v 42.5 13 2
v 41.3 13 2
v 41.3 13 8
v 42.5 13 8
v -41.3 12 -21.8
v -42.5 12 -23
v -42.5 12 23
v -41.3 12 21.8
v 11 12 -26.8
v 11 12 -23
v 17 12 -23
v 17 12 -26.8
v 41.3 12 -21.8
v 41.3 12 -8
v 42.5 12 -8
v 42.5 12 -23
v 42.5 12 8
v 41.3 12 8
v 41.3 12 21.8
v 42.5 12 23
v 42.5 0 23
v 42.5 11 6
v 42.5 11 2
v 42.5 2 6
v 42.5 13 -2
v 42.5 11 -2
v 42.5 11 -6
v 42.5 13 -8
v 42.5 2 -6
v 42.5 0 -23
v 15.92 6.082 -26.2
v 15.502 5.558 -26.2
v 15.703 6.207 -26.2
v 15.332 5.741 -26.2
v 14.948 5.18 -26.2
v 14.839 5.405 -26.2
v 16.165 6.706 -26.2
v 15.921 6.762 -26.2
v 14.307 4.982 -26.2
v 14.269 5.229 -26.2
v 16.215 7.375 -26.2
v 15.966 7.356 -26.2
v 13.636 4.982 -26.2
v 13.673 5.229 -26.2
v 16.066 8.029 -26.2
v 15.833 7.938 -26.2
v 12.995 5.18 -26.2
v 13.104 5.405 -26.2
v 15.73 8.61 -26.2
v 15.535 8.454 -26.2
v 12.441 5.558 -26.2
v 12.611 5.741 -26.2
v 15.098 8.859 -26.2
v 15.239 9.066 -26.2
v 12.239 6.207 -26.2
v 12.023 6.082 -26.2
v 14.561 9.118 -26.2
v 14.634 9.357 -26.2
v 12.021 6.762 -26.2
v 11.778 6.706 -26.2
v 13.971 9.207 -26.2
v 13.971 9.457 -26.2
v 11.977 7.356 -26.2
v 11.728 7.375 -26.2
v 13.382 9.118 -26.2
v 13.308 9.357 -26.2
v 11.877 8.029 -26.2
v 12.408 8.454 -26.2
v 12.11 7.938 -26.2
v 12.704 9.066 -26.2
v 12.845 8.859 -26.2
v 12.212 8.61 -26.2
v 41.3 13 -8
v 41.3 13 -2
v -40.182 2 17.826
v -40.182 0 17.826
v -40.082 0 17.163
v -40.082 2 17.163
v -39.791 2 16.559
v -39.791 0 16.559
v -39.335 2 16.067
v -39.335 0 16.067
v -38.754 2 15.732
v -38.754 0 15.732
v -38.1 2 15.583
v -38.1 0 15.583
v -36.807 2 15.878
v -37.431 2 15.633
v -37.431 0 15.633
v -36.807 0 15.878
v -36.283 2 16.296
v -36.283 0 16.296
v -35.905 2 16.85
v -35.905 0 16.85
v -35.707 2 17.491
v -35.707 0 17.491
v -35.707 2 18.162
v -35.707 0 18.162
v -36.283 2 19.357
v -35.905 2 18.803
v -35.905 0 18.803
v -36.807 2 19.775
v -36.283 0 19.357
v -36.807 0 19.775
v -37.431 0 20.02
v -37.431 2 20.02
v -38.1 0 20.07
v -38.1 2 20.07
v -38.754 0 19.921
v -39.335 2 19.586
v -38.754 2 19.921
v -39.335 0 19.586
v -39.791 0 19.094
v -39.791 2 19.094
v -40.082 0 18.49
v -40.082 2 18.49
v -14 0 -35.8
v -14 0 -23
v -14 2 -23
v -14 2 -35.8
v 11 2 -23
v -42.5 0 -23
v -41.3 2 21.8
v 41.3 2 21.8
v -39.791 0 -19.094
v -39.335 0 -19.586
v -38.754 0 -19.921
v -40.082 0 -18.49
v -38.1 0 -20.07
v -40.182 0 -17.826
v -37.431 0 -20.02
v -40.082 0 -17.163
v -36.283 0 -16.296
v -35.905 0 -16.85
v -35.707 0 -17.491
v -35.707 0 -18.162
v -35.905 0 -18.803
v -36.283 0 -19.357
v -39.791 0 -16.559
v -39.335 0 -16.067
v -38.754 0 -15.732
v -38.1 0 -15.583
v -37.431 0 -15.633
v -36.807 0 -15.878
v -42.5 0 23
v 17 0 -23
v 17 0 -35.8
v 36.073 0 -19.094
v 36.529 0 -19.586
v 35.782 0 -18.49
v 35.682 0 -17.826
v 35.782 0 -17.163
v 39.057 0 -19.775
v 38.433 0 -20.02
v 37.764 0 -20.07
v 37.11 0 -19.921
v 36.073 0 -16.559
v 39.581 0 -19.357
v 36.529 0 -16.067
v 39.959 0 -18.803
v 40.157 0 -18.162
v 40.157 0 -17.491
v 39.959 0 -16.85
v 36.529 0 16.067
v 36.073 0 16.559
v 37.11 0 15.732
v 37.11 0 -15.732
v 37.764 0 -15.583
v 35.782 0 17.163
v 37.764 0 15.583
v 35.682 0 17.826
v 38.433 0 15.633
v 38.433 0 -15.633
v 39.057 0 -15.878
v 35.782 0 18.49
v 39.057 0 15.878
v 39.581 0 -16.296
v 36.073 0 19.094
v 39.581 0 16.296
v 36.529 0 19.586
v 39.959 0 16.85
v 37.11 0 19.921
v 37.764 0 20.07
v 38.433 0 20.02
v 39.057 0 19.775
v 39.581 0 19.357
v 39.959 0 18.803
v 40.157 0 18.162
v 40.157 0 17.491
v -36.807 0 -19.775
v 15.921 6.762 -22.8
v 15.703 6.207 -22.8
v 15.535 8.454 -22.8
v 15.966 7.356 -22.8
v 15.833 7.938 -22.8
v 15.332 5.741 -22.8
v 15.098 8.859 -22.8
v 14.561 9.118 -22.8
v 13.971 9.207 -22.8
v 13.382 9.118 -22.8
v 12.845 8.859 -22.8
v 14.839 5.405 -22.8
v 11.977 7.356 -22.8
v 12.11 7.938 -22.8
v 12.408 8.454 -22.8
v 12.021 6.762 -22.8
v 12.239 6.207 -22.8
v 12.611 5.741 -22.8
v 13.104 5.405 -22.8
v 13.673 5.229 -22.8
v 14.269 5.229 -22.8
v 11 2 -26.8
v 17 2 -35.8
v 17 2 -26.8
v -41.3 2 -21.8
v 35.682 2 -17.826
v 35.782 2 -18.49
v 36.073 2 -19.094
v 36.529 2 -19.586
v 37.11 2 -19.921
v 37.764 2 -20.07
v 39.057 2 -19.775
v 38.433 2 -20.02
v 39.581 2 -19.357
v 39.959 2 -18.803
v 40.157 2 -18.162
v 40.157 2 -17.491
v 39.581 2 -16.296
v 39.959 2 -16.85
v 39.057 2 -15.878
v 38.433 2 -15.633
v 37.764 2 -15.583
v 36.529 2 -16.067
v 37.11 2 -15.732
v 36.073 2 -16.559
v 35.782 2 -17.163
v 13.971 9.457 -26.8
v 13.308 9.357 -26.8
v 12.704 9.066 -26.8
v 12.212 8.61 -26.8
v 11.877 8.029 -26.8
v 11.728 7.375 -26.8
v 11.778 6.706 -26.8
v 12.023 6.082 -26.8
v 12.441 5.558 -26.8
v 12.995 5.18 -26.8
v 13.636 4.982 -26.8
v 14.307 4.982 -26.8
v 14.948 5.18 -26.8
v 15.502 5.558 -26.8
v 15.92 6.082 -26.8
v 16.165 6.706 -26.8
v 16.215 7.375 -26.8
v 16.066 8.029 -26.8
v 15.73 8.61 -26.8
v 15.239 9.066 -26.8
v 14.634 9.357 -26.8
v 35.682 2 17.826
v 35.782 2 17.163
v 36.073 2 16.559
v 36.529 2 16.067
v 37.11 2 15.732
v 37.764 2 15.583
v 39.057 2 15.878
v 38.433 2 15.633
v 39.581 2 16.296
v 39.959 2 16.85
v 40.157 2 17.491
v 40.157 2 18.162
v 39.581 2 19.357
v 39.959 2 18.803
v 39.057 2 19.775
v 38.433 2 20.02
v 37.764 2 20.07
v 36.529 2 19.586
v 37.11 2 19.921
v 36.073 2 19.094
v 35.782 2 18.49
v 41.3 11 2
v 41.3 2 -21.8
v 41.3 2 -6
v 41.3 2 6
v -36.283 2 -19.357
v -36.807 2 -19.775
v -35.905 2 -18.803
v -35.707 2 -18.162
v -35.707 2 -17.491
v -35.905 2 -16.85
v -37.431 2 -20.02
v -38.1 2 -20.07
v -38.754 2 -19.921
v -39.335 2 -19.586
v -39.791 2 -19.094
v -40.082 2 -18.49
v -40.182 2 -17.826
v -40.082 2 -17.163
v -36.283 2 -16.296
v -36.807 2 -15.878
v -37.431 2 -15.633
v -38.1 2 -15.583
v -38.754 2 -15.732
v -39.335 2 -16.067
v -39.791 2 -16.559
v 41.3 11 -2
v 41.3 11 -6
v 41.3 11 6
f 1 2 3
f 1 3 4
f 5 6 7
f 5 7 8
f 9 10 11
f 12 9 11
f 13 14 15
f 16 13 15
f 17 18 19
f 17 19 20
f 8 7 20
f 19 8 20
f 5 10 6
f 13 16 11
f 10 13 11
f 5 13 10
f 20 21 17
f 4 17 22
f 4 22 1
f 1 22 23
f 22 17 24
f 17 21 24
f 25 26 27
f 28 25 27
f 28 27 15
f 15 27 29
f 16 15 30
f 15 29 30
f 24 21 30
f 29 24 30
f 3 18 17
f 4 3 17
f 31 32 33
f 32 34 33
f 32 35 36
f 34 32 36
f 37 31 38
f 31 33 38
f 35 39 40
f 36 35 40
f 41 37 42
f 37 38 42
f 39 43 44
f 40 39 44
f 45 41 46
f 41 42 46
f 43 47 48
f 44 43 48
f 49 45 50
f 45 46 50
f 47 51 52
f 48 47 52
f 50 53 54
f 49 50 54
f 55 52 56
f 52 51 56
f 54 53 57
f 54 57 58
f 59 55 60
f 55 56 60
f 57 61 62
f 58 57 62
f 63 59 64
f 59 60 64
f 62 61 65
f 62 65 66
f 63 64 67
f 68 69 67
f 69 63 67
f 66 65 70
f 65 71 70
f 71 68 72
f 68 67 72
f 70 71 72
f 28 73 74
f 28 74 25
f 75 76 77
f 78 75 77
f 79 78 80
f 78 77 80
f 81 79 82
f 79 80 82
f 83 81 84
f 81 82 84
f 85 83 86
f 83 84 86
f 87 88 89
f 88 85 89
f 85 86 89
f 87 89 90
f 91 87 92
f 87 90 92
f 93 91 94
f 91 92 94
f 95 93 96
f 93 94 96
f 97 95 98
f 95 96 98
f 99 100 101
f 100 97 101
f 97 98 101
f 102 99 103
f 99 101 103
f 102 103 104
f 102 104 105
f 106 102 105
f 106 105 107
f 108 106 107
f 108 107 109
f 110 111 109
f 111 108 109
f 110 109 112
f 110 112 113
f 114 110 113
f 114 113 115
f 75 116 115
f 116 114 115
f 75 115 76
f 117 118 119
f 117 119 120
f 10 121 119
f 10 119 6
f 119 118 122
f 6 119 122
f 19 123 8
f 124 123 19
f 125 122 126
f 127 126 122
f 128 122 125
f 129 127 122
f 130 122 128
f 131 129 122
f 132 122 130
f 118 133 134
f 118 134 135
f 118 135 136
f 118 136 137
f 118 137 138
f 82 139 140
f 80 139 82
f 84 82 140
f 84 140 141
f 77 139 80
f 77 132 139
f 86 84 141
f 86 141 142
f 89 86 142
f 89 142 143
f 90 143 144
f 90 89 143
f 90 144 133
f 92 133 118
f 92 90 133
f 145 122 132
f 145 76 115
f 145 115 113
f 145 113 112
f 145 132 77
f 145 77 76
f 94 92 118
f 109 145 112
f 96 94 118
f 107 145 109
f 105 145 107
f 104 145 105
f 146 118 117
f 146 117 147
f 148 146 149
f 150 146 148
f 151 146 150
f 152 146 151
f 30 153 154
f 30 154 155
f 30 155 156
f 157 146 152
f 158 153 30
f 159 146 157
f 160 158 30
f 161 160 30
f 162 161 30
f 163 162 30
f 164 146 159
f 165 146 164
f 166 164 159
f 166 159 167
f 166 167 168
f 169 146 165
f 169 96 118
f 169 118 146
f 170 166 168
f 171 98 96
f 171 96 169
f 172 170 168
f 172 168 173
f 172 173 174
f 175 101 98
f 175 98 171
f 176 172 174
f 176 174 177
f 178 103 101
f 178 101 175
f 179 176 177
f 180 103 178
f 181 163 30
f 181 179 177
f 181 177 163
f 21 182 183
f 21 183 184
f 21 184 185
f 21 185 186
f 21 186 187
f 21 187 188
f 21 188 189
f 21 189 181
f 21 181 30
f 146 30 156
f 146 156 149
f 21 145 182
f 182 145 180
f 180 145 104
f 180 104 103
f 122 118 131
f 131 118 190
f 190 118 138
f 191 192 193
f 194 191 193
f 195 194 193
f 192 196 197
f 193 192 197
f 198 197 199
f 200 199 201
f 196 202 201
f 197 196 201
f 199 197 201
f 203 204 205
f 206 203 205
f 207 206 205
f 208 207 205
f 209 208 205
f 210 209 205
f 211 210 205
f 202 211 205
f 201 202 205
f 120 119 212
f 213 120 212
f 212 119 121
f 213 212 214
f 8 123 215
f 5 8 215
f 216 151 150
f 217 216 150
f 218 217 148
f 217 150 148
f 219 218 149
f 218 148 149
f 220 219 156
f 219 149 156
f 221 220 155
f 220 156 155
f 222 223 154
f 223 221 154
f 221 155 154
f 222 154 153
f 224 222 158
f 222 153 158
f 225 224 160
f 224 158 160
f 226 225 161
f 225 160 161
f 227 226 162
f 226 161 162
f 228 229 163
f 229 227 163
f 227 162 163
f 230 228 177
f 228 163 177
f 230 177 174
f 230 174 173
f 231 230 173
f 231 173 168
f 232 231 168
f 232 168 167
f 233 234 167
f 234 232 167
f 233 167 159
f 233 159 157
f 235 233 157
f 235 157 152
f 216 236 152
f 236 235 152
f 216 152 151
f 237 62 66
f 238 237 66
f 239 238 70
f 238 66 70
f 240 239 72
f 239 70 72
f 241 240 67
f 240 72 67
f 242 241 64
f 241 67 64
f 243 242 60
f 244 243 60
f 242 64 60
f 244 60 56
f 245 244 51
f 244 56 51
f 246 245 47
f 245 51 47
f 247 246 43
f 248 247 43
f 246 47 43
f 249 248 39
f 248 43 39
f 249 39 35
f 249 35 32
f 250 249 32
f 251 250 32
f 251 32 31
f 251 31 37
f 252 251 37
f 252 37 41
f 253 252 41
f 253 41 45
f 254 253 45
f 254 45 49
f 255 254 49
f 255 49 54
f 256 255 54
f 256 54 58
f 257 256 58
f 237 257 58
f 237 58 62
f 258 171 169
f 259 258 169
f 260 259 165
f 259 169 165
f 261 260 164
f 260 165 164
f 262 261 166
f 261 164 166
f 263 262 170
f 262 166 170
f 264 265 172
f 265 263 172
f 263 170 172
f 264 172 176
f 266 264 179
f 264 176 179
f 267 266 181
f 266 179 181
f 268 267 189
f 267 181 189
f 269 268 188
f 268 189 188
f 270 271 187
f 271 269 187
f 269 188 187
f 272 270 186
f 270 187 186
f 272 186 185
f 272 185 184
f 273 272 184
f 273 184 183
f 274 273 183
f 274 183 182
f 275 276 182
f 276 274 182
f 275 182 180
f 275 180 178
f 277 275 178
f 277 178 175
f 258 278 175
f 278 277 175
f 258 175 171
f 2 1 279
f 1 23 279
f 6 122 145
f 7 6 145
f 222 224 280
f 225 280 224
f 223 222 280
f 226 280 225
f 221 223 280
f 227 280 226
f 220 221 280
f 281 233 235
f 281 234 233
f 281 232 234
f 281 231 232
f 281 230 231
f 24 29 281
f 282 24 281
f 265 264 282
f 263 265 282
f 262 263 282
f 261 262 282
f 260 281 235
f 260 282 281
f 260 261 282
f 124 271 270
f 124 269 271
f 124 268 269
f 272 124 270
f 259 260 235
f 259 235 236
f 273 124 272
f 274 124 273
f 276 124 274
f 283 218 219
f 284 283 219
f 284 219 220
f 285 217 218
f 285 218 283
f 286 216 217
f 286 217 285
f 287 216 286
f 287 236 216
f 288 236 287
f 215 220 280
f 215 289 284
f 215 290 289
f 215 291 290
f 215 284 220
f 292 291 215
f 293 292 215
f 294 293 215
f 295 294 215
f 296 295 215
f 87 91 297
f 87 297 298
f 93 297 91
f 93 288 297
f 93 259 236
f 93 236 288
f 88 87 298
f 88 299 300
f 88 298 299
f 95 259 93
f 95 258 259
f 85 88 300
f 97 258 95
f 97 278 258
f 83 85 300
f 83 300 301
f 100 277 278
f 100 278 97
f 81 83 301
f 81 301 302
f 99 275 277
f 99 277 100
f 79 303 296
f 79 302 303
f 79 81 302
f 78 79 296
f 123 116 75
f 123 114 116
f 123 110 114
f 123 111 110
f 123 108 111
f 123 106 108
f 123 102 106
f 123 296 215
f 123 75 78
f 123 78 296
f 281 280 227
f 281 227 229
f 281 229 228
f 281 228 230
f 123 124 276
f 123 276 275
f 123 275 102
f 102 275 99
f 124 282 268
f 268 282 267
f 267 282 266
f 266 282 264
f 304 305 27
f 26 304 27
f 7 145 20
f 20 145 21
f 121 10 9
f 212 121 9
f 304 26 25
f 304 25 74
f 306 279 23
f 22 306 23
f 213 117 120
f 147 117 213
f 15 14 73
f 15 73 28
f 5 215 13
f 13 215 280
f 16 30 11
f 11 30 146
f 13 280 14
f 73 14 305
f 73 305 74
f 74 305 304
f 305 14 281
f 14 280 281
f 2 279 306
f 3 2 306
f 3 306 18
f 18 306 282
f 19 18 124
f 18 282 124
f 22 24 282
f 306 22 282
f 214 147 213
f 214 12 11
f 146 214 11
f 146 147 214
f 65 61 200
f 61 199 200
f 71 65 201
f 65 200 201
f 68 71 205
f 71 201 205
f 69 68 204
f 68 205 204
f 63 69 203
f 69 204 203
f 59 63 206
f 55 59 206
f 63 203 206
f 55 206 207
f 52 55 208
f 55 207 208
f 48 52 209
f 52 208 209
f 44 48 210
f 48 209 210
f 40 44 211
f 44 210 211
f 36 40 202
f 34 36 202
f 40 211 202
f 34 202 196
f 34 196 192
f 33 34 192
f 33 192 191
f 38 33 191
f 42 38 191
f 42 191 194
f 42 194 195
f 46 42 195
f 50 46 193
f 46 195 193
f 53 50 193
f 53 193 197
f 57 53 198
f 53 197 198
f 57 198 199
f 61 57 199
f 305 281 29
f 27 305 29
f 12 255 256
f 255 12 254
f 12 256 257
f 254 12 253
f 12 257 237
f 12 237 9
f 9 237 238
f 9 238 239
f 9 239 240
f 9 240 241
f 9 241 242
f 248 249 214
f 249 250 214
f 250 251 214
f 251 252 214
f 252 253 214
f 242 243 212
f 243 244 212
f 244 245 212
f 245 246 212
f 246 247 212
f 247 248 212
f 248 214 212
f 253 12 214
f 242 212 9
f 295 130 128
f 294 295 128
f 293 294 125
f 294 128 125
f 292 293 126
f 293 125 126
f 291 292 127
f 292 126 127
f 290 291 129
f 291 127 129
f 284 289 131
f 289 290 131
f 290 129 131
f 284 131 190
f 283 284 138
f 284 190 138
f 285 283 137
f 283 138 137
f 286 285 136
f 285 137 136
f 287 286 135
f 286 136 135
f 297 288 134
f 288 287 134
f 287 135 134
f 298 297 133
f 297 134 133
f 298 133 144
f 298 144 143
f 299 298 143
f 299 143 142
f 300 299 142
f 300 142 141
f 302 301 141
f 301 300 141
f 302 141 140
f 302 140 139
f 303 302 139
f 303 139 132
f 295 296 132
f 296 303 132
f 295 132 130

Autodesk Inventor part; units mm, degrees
ref_plane "YZ Plane" through (0, 0, 0) normal (1, 0, 0) x (0, 1, 0)
ref_plane "XZ Plane" through (0, 0, 0) normal (0, 1, 0) x (-1, 0, 0)
ref_plane "XY Plane" through (0, 0, 0) normal (0, 0, 1) x (1, 0, 0)
sketch "Szkic2" plane through (0, 0, 0) normal (0, 1, 0) x (-1, 0, 0)
  line L0 (42.5, 23) -> (-42.5, 23)
  line L1 (-42.5, 23) -> (-42.5, -23)
  line L2 (-42.5, -23) -> (42.5, -23)
  line L3 (42.5, -23) -> (42.5, 23)
  line L4 (0, 91.0722) -> (0, -100.1143)
  line L5 (-78.4738, 0) -> (170.7955, 0)
  circle A0 centre (37.932, 17.8265) radius 2.25
  circle A1 centre (37.932, -17.8265) radius 2.25
  circle A2 centre (-37.932, 17.8265) radius 2.25
  circle A3 centre (-37.932, -17.8265) radius 2.25
  point P0 (0, 0)
  dimension "d7" = 46
  dimension "d8" = 85
  dimension "d14" = 4.5
  dimension "d16" = 35.653
  dimension "d18" = 23
  dimension "d21" = 75.864
  dimension "d22" = 42.5
extrude "Wyciągnięcie proste2" add sketch "Szkic2" along normal blind 2
sketch "Szkic3" plane through (0, 2, 0) normal (0, 1, 0) x (1, 0, 0)
  line L0 (-42.5, -23) -> (42.5, -23) projected
  line L1 (42.5, -23) -> (42.5, 23) projected
  line L2 (41.3, -23) -> (42.5, -23)
  line L3 (42.5, -23) -> (42.5, 23)
  line L4 (42.5, 23) -> (41.3, 23)
  line L5 (41.3, 23) -> (41.3, -23)
  line L6 (-42.5, 23) -> (-42.5, -23) projected
  line L7 (42.5, -23) -> (-42.5, -23)
  line L8 (-42.5, -23) -> (-42.5, -21.8)
  line L9 (-42.5, -21.8) -> (42.5, -21.8)
  line L10 (42.5, -21.8) -> (42.5, -23)
  line L11 (42.5, 23) -> (-42.5, 23)
  line L12 (-42.5, 23) -> (-42.5, 21.8)
  line L13 (-42.5, 21.8) -> (42.5, 21.8)
  line L14 (42.5, 21.8) -> (42.5, 23)
  line L15 (42.5, 23) -> (-42.5, 23) projected
  line L16 (-42.5, -23) -> (-41.3, -23)
  line L17 (-41.3, -23) -> (-41.3, 23)
  line L18 (-41.3, 23) -> (-42.5, 23)
  line L19 (-42.5, 23) -> (-42.5, -23)
  line L20 (42.5, -6) -> (41.3, -6)
  line L21 (41.3, -6) -> (41.3, 6)
  line L22 (41.3, 6) -> (42.5, 6)
  line L23 (36.3786, 0) -> (45.7918, 0)
  point P0 (0, 0)
  point P1 (41.3, -21.8)
  point P2 (-41.3, -21.8)
  point P3 (-41.3, 21.8)
  point P4 (41.3, 21.8)
  dimension "d25" = 1.2
  dimension "d26" = 1.2
  dimension "d27" = 1.2
  dimension "d28" = 1.2
  dimension "d29" = 12
  dimension "d30" = 6
extrude "Wyciągnięcie proste3" add sketch "Szkic3" along normal blind 10 contours L6 L9 L17 L0 | L17 L9 L5 L0 | L6 L13 L17 L9 | L5 L9 L1 L0 | L6 L11 L17 L13 | L5 L20 L1 L9 | L17 L11 L5 L13 | L13 L1 L22 L5 | L5 L4 L1 L13
sketch "Szkic5" plane through (0, 12, 0) normal (0, 1, 0) x (1, 0, 0)
  line L0 (41.3, -6) -> (41.3, -21.8) projected
  line L1 (42.5, -6) -> (42.5, 6) projected
  line L2 (41.3, -8) -> (42.5, -8)
  line L3 (42.5, -8) -> (42.5, -2)
  line L4 (42.5, -2) -> (41.3, -2)
  line L5 (41.3, -2) -> (41.3, -8)
  line L6 (34.6755, 0) -> (49.4443, 0)
  line L7 (40.0187, -6) -> (43.7777, -6)
  line L8 (41.3, 8) -> (42.5, 8)
  line L9 (42.5, 8) -> (42.5, 2)
  line L10 (42.5, 2) -> (41.3, 2)
  line L11 (41.3, 2) -> (41.3, 8)
  line L12 (40.0187, 6) -> (43.7777, 6)
  point P0 (0, 0)
  point P1 (41.3, 6)
  dimension "d33" = 6
  dimension "d34" = 2
extrude "Wyciągnięcie proste4" add sketch "Szkic5" along normal blind 1 contours L7 L3 L2 L0 | L12 L11 L8 L9
extrude "Wyciągnięcie proste5" add sketch "Szkic5" along normal mid plane 2 contours L10 L11 L12 L1 | L5 L4 L1 L7
sketch "Szkic6" plane through (42.5, 0, -23) normal (0, 0, -1) x (-1, 0, 0)
  line L0 (83.8, 12) -> (1.2, 12) projected
  line L1 (26, 12) -> (26, 0)
  line L2 (31.5, 12) -> (31.5, 0)
  line L3 (53.5, 12) -> (53.5, 0)
  line L4 (0, 0) -> (85, 0) projected
  line L5 (56.5, 12) -> (56.5, 0)
  line L6 (0, 0) -> (0, 12) projected
  circle A0 centre (28.6456, 7.207) radius 1.5875
  line L7 (1.2, 2) -> (83.8, 2) projected
  line L8 (26, 2) -> (56.5, 2)
  point P0 (42.5, 0)
  dimension "d39" = 5.5
  dimension "d40" = 22
  dimension "d41" = 3
  dimension "d42" = 31.5
  dimension "d43" = 3.175
  dimension "d55" = 5.207
sketch "Szkic8" plane through (0, 0, 0) normal (0, -1, 0) x (1, 0, 0)
  line L0 (42.5, -23) -> (-42.5, -23) projected
  line L1 (20.6822, -23) -> (-15.9857, -23)
  line L2 (-15.9857, -23) -> (-15.9857, -42.1071)
  line L3 (-15.9857, -42.1071) -> (20.6822, -42.1071)
  line L4 (20.6822, -42.1071) -> (20.6822, -23)
  line L5 (17, -23) -> (11, -23)
  line L6 (11, -23) -> (11, -35.8)
  line L7 (11, -35.8) -> (17, -35.8)
  line L8 (17, -35.8) -> (17, -23)
  line L9 (11, -23) -> (-11, -23)
  line L10 (-11, -23) -> (-11, -35.8)
  line L11 (-11, -35.8) -> (11, -35.8)
  line L12 (11, -35.8) -> (11, -23)
  line L13 (-11, -23) -> (-14, -23)
  line L14 (-14, -23) -> (-14, -35.8)
  line L15 (-14, -35.8) -> (-11, -35.8)
  line L16 (-11, -35.8) -> (-11, -23)
  line L17 (17, -26.8) -> (-14, -26.8)
  point P0 (0, 0)
  point P1 (11, -26.8)
  point P2 (-14, -23)
  point P3 (17, -23)
  dimension "d45" = 6
  dimension "d46" = 22
  dimension "d47" = 3
  dimension "d48" = 31.5
  dimension "d49" = 3.8
  dimension "d50" = 9
extrude "Wyciągnięcie proste6" add sketch "Szkic8" against normal blind 2 contours L6 L17 L10 L0 | L8 L7 L6 L17 | L10 L17 L14 L0 | L6 L11 L10 L17 | L10 L15 L14 L17
extrude "Wyciągnięcie proste7" add sketch "Szkic8" against normal blind 12 contours L8 L17 L6 L0
sketch "Szkic9" plane through (17, 2, -26.8) normal (0, 0, -1) x (-1, 0, 0)
  circle A0 centre (3.0287, 5.207) radius 1.4322
  line L0 (0, 0) -> (31, 0) projected
  point P0 (17, -2)
  dimension "d63" = 5.207
hole "Otwór2" at (13.9713, 7.207, -26.8) direction (0, 0, 1) diameter 4 depth 4 counterbore diameter 4.5 counterbore depth 0.6
properties part number "prent1"
